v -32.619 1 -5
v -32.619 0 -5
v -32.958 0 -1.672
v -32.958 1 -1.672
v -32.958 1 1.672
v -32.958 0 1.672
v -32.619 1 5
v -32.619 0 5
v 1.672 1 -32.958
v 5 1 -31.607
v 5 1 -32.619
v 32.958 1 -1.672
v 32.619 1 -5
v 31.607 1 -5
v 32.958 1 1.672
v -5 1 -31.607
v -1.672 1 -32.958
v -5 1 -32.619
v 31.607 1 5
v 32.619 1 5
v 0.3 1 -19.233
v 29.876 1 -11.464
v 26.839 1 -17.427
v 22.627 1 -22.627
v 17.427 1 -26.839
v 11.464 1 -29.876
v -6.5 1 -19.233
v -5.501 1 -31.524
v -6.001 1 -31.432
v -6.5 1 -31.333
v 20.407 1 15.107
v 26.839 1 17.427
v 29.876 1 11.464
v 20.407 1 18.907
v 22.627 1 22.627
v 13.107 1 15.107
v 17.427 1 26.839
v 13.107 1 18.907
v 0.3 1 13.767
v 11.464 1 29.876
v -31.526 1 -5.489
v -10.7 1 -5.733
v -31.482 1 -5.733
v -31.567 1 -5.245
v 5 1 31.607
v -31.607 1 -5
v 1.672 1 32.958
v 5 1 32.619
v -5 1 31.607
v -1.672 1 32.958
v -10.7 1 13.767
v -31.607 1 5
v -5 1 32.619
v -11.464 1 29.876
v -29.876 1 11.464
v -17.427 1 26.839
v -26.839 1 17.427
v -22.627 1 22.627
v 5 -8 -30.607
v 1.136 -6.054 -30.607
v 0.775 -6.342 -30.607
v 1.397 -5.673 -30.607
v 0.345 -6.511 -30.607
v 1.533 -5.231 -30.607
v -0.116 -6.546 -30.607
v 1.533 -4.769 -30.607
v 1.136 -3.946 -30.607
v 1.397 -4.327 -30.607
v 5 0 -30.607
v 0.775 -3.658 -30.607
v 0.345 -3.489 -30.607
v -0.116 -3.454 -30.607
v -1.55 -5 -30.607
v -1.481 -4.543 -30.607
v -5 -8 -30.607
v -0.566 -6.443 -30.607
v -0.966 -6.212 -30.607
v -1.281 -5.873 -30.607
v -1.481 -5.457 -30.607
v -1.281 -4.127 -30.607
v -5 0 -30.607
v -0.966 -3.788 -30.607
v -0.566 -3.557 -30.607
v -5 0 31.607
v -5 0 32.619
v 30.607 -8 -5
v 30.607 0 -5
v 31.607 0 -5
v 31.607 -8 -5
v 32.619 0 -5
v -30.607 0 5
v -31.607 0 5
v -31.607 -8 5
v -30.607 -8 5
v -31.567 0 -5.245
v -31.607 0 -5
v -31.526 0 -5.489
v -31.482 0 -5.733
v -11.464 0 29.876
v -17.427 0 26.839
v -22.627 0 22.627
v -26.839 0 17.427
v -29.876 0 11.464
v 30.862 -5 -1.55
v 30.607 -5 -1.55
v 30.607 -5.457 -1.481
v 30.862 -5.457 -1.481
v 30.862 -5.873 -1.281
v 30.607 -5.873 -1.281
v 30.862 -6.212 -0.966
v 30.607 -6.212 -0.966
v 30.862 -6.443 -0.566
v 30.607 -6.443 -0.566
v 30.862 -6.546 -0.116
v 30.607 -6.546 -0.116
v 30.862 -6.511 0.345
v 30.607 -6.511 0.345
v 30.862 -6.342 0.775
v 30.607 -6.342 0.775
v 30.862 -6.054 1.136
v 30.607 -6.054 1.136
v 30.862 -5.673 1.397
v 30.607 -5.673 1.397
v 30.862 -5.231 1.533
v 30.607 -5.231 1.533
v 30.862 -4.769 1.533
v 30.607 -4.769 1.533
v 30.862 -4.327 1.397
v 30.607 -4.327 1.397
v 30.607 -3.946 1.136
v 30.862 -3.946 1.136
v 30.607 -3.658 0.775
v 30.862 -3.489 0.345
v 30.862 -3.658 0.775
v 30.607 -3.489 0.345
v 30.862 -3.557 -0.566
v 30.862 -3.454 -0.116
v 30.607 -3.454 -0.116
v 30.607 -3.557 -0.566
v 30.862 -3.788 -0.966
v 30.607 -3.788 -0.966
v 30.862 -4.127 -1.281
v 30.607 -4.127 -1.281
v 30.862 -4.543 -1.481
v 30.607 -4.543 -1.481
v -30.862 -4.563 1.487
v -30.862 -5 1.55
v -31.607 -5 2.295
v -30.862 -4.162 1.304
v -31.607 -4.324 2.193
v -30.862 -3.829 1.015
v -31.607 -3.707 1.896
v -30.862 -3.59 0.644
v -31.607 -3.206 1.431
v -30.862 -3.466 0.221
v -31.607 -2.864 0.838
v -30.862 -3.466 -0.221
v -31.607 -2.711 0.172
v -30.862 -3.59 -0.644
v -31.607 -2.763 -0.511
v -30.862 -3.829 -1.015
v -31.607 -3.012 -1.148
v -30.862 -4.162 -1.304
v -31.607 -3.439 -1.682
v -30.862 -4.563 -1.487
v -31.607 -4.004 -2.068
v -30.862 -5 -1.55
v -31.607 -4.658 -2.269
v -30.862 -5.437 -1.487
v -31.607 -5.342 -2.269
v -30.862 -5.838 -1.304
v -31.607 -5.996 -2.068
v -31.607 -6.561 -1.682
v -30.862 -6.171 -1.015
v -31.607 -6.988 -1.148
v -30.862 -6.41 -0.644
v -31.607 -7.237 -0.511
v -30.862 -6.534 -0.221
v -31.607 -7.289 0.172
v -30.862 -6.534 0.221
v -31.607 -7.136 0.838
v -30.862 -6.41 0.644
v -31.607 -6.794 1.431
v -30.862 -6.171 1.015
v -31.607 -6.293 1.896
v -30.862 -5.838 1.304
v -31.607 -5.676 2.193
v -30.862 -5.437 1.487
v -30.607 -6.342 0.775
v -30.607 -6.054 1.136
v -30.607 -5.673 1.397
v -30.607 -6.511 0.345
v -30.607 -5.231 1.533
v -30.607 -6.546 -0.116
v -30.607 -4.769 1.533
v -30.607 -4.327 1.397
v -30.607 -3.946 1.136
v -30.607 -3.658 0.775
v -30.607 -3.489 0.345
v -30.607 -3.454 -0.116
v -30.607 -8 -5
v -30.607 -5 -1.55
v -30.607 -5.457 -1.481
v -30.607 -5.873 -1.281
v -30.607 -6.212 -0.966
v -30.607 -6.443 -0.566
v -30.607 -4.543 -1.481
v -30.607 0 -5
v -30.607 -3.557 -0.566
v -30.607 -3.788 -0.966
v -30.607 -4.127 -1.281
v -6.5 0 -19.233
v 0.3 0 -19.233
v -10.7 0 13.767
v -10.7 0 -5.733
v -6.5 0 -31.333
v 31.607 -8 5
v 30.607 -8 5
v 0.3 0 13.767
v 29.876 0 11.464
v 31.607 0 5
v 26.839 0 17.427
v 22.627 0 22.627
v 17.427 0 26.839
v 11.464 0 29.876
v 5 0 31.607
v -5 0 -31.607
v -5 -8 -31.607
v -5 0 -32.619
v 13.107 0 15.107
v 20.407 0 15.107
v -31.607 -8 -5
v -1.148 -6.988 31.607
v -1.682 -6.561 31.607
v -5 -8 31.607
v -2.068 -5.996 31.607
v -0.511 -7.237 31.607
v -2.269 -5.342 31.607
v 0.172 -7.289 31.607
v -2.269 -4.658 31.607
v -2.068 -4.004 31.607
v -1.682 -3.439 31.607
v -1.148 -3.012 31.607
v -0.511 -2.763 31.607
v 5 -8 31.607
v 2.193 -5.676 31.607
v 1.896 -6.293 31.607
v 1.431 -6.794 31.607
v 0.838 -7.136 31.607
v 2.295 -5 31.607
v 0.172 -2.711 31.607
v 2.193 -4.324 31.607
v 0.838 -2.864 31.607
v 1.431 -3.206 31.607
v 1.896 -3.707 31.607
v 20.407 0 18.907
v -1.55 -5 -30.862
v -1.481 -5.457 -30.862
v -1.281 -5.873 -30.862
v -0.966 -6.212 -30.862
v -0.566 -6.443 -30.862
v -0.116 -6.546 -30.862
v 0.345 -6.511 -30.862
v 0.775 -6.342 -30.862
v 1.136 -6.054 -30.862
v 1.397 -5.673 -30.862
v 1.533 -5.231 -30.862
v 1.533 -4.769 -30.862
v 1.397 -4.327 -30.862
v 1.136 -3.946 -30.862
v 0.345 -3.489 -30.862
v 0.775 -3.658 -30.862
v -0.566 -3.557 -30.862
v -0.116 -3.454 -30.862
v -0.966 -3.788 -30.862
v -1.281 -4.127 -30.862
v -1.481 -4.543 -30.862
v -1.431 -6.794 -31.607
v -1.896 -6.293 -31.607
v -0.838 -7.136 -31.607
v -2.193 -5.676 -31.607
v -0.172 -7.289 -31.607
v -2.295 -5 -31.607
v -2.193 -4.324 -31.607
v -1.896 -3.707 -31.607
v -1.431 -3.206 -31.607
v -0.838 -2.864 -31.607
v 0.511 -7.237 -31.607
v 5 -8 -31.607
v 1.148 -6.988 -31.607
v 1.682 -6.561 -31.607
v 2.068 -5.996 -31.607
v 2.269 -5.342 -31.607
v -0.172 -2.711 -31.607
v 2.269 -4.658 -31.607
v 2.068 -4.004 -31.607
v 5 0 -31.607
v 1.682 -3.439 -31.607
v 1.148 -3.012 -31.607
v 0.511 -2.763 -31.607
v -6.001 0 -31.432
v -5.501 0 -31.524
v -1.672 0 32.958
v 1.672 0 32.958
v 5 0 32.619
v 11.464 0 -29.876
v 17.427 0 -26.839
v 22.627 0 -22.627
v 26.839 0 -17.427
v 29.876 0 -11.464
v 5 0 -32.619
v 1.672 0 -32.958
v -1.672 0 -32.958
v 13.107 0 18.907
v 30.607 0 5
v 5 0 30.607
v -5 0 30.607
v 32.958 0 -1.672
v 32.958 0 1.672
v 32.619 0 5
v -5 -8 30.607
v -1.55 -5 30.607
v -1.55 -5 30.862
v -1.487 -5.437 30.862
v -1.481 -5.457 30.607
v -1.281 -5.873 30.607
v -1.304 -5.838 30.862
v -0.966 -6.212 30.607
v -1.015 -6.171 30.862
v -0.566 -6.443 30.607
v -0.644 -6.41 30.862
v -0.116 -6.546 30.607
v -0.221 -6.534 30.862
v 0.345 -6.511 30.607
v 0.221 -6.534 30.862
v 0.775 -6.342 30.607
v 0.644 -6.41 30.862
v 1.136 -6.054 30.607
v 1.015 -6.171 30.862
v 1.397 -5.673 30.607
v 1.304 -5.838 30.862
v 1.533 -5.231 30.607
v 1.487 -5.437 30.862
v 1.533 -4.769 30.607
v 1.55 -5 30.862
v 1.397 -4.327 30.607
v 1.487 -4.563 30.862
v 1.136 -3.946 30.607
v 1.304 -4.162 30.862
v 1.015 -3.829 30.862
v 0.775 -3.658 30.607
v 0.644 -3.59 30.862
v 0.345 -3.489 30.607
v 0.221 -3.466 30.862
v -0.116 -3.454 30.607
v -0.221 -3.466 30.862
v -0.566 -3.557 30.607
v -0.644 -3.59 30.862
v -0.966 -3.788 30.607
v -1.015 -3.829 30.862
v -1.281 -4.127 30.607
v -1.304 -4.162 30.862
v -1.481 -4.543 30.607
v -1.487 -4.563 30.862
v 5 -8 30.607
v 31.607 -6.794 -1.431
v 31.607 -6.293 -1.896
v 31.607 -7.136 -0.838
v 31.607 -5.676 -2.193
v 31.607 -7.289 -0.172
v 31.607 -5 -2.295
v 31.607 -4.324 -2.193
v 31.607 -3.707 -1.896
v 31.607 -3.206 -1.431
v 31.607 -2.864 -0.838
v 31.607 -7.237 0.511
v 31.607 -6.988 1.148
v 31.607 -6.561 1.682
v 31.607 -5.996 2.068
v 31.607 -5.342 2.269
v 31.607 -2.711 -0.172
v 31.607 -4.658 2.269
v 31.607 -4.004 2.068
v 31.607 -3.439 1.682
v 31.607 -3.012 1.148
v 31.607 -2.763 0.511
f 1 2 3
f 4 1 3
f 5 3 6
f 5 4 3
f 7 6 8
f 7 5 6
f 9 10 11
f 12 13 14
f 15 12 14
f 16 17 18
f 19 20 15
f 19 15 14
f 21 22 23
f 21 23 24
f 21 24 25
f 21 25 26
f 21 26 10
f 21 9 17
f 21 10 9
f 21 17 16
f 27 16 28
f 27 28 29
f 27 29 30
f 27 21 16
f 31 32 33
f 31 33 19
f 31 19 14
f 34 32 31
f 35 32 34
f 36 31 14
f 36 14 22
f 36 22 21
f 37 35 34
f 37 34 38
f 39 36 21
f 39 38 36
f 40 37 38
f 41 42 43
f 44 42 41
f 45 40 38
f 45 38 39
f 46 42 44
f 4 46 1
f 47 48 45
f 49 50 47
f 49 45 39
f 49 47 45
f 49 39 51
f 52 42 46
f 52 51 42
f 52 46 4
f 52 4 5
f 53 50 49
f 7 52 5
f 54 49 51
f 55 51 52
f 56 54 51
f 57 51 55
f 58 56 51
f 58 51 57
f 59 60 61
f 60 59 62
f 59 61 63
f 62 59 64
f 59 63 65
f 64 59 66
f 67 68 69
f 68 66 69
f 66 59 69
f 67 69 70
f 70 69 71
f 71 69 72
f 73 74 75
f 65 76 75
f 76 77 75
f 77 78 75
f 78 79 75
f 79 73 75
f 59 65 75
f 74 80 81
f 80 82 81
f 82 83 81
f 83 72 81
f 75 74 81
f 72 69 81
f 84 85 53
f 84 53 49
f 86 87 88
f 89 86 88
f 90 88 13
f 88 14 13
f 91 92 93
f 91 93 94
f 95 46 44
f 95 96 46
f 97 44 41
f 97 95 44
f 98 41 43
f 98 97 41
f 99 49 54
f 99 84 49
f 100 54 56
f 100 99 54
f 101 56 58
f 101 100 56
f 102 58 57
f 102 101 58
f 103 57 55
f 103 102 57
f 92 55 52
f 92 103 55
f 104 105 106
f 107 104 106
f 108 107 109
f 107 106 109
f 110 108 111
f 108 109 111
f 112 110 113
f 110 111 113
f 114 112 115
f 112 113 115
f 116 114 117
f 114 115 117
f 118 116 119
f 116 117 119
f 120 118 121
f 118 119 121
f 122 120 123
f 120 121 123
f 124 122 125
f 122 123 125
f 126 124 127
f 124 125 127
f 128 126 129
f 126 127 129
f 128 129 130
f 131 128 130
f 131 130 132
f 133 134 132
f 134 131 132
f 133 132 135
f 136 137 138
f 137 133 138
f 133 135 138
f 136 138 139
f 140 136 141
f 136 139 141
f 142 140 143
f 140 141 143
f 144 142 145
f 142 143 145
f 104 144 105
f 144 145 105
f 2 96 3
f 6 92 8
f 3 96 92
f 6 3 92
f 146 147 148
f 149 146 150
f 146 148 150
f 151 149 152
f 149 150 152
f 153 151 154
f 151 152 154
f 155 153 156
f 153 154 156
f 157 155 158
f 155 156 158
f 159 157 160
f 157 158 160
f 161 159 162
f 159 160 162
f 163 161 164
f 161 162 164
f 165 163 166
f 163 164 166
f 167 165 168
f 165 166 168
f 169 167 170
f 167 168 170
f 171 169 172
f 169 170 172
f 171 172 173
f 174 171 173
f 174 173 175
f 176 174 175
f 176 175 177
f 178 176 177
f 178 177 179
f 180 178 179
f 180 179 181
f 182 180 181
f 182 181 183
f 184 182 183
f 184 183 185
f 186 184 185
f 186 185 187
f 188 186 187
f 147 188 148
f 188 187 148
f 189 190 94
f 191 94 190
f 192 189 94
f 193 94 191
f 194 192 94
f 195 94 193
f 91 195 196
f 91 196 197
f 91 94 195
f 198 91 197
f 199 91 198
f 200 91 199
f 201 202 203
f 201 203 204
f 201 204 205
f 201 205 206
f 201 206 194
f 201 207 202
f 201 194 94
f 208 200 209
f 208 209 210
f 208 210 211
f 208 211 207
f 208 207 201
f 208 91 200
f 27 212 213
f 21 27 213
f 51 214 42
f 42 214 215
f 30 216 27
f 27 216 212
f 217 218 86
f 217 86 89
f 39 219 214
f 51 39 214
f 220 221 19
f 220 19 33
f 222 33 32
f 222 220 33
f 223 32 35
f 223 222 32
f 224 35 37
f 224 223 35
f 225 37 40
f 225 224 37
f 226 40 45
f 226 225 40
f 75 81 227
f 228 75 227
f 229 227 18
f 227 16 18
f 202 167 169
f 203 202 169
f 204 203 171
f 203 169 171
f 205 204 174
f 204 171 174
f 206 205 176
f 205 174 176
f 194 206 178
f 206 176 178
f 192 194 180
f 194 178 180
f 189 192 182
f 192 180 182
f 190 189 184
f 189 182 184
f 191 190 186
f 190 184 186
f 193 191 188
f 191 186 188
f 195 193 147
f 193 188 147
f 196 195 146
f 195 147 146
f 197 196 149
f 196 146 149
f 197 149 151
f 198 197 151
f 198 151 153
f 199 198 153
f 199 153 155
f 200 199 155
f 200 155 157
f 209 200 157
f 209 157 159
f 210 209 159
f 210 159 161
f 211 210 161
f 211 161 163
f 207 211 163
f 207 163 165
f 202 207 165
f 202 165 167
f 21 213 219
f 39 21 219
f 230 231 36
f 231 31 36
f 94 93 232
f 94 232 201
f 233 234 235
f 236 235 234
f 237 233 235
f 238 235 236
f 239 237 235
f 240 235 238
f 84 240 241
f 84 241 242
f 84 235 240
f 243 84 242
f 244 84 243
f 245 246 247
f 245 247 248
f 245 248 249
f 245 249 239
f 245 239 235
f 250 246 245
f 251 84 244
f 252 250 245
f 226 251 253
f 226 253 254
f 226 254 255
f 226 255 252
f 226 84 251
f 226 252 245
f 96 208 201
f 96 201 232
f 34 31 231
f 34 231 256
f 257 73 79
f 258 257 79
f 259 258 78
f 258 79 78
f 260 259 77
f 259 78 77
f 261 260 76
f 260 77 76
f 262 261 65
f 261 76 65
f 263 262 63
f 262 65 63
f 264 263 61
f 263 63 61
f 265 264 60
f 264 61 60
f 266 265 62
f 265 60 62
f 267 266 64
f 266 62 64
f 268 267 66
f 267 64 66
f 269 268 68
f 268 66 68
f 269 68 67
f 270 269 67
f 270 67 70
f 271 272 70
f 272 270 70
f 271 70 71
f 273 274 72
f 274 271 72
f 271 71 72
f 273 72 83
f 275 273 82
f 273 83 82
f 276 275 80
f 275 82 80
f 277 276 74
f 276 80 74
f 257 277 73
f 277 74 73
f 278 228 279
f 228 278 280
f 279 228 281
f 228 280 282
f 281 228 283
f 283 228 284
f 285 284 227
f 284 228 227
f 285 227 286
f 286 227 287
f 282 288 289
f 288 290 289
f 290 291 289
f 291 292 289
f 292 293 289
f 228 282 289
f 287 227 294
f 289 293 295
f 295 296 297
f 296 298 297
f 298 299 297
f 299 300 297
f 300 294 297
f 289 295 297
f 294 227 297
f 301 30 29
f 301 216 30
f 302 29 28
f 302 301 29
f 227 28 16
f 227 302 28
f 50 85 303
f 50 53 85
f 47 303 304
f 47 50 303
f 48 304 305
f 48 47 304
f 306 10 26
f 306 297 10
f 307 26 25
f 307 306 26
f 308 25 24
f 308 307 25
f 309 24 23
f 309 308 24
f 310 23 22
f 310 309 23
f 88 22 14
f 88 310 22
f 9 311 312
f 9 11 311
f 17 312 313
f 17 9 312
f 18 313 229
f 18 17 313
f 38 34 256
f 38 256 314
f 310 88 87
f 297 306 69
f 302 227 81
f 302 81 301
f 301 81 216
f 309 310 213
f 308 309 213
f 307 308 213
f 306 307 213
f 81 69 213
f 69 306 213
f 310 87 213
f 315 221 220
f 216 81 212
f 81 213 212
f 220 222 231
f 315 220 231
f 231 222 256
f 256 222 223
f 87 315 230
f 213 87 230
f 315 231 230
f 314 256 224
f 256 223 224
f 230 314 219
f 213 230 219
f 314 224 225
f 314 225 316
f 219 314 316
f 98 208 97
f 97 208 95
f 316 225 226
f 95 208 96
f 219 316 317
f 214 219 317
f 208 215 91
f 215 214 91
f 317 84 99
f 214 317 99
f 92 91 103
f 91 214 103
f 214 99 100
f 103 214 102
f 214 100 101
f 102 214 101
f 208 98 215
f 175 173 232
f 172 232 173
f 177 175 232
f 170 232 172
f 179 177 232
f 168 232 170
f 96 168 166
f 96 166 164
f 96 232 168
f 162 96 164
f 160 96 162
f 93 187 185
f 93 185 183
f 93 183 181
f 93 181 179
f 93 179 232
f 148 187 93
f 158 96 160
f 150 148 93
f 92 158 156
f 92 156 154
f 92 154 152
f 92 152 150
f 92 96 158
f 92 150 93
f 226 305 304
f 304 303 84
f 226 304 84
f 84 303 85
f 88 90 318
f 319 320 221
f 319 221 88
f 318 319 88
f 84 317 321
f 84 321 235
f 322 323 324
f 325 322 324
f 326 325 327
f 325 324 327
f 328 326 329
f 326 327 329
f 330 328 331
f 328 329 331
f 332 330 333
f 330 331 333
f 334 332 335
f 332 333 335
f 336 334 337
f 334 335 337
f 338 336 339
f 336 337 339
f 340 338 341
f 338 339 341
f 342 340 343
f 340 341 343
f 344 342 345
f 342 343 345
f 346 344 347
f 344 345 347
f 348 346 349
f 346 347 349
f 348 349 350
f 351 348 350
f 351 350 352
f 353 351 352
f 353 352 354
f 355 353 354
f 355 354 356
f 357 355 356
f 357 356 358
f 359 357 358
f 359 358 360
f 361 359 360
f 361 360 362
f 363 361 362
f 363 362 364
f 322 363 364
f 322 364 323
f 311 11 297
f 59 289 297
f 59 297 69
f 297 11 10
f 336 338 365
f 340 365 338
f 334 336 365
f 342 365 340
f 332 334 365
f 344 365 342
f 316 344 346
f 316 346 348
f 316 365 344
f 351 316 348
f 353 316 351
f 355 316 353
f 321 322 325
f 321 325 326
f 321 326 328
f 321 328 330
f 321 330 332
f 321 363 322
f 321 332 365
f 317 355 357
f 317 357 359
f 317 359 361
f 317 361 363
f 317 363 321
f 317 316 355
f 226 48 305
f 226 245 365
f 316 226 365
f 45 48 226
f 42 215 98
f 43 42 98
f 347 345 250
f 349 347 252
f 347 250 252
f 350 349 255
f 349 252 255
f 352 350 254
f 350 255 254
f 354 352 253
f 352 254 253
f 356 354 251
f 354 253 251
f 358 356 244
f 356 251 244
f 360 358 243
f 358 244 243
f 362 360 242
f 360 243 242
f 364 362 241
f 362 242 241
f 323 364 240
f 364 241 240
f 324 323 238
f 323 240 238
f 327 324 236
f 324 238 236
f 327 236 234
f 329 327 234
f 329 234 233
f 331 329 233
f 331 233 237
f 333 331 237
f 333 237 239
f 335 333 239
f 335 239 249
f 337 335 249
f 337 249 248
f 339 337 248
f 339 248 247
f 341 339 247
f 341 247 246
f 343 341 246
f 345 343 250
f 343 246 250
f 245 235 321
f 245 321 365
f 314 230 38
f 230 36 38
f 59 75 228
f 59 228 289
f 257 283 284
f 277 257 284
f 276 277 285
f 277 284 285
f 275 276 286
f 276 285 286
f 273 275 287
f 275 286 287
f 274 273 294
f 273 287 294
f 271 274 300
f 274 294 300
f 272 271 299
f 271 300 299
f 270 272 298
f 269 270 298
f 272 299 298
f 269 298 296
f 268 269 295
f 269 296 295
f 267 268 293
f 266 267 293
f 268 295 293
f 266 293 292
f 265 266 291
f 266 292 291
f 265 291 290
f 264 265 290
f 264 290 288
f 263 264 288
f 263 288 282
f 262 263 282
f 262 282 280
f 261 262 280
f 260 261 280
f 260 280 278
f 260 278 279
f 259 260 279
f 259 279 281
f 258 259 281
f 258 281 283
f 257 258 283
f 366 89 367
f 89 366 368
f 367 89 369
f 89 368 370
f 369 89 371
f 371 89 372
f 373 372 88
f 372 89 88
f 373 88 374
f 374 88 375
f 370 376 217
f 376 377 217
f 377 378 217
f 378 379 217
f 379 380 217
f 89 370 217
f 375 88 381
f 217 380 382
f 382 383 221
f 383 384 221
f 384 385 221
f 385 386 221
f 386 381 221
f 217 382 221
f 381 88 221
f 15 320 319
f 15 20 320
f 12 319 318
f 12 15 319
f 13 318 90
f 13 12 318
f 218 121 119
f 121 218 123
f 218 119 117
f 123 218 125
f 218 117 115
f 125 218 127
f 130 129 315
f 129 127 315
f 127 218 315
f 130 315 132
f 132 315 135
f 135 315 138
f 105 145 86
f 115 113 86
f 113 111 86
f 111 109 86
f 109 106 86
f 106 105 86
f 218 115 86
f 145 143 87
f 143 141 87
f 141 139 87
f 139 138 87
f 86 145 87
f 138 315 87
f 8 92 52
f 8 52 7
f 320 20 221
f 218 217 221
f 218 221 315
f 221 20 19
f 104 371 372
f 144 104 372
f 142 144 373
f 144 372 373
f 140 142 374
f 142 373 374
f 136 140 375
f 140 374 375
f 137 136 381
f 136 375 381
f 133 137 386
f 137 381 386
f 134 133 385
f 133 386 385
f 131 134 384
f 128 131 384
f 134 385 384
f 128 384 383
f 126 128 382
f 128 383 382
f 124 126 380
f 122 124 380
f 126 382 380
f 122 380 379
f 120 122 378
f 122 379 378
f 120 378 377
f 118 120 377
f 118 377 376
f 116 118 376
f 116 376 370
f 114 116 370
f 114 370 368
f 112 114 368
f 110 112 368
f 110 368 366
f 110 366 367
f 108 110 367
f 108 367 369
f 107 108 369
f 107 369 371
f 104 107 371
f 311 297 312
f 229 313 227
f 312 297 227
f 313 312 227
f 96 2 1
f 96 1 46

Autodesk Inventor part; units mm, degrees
ref_plane "YZ Plane" through (0, 0, 0) normal (1, 0, 0) x (0, 1, 0)
ref_plane "XZ Plane" through (0, 0, 0) normal (0, 1, 0) x (-1, 0, 0)
sketch "Sketch1" plane through (0, 0, 0) normal (0, 1, 0) x (-1, 0, 0)
  arc A0 (31.6389, 4.7938) -> (6.5, -31.3329) centre (0, 0) ccw
  line L0 (-5, 33) -> (5, 33)
  line L1 (5, 33) -> (5, 31.607)
  line L2 (5, -33) -> (-5, -33)
  line L3 (-5, -33) -> (-5, 5)
  line L4 (-5, 33) -> (5, -33) construction
  line L5 (5, 33) -> (-5, -33) construction
  line L6 (-33, 5) -> (-5, 5)
  line L7 (33, 5) -> (33, -5)
  line L8 (33, -5) -> (31.607, -5)
  line L9 (-33, -5) -> (-33, 5)
  line L10 (-33, 5) -> (33, -5) construction
  line L11 (33, 5) -> (-33, -5) construction
  arc A1 (4.7938, -31.6389) -> (6.5, -31.3329) centre (0, 0) ccw
  line L12 (6.5, -31.3329) -> (6.5, -19.2329)
  line L13 (6.5, -19.2329) -> (-0.3, -19.2329)
  line L14 (-0.3, -19.2329) -> (-0.3, -5.7329)
  line L15 (-0.3, 13.7671) -> (5, 13.7671)
  line L16 (10.7, 13.7671) -> (10.7, 5)
  line L17 (10.7, -5.7329) -> (31.4823, -5.7329)
  arc A2 (31.4823, -5.7329) -> (31.607, -5) centre (0, 0) ccw
  arc A3 (31.6389, -4.7938) -> (31.6389, 4.7938) centre (0, 0) ccw
  line L18 (5, -19.2329) -> (5, -33)
  line L19 (5, 13.7671) -> (5, 5)
  line L20 (10.7, 1.6212) -> (10.7, -5.7329)
  line L21 (-0.3, -5) -> (-0.3, 5)
  arc A4 (6.5, -31.3329) -> (10.7, -30.1581) centre (0, 0) ccw
  line L22 (5, -5) -> (0.7576, -5)
  line L23 (5, 5) -> (10.7, 5)
  line L24 (-5, 5) -> (-0.3, 5)
  line L25 (-5, -5) -> (-33, -5)
  line L26 (-5, 5) -> (-5, 33)
  line L27 (5, 5) -> (5, -5)
  line L28 (5, 31.607) -> (5, 13.7671)
  arc A5 (10.7, -30.1581) -> (31.4823, -5.7329) centre (0, 0) ccw
  arc A6 (6.5, -31.3329) -> (31.6389, -4.7938) centre (0, 0) ccw
  line L29 (-0.3, -5.7329) -> (-0.3, -5)
  line L30 (5, -5) -> (5, -5.7329)
  line L31 (10.7, 5) -> (31.607, 5)
  line L32 (10.7, -5) -> (5, -5)
  line L33 (0.7576, 5) -> (5, 5)
  line L34 (-0.3, 5) -> (0.7576, 5)
  line L35 (5, 13.7671) -> (10.7, 13.7671)
  line L36 (-0.3, 5) -> (-0.3, 13.7671)
  line L37 (31.607, 5) -> (33, 5)
  line L38 (10.7, 5) -> (10.7, 1.6212)
  line L39 (31.607, -5) -> (10.7, -5)
  line L40 (0.7576, -5) -> (-5, -5)
  line L41 (5, -5.7329) -> (5, -19.2329)
  dimension "d0" = 64
  dimension "d1" = 10
  dimension "d2" = 66
  dimension "d3" = 66
  dimension "d4" = 10
  dimension "d11" = 12.1
  dimension "d12" = 6.8
  dimension "d13" = 33
  dimension "d14" = 0.3
  dimension "d15" = 11
  dimension "d16" = 19.5
ref_plane "Work Plane1" through (0, 1, 0) normal (0, 1, 0) x (1, 0, 0)
sketch "Sketch2" plane through (0, 1, 0) normal (0, 1, 0) x (1, 0, 0)
  circle A0 centre (0, 0) radius 33
  dimension "d7" = 66
extrude "Extrusion2" [suppressed]
extrude "Extrusion3" add sketch "Sketch1" along normal blind 1 contours A3 A6 L39 L20 L38 L31 A0 | A0 L37 L7 L8 A6 A3 | L31 L16 L35 L28 A0 | L28 L15 L36 L24 L26 A0 | A0 L26 L0 L1 | A2 L17 L20 L39 | L26 L6 A0 | L6 L3 L25 A0 | A0 L25 L9 L6 | L24 L21 L40 L3 | L25 L3 A0 | L40 L29 L14 L13 L18 A0 L3 | A0 L18 L13 L12 | A0 L18 L2 L3
sketch "Sketch3" plane through (0, 0, 0) normal (0, -1, 0) x (1, 0, 0)
  line L0 (-5, -33) -> (-5, -31.607) projected
  line L1 (-5, -31.607) -> (5, -31.607)
  line L2 (5, -31.607) -> (5, -30.607)
  line L3 (5, -30.607) -> (-5, -30.607)
  line L4 (-5, -30.607) -> (-5, -31.607)
  line L5 (-33, 5) -> (-31.607, 5) projected
  line L6 (-31.607, 5) -> (-30.607, 5)
  line L7 (-30.607, 5) -> (-30.607, -5)
  line L8 (-30.607, -5) -> (-31.607, -5)
  line L9 (-31.607, -5) -> (-31.607, 5)
  line L10 (-5, 31.607) -> (-5, 33) projected
  line L11 (-5, 31.607) -> (5, 31.607)
  line L12 (5, 31.607) -> (5, 30.607)
  line L13 (5, 30.607) -> (-5, 30.607)
  line L14 (-5, 30.607) -> (-5, 31.607)
  line L15 (31.607, 5) -> (30.607, 5)
  line L16 (30.607, 5) -> (30.607, -5)
  line L17 (30.607, -5) -> (31.607, -5)
  line L18 (31.607, -5) -> (31.607, 5)
  line L19 (31.607, 5) -> (33, 5) projected
  dimension "d21" = 10
  dimension "d22" = 1
  dimension "d23" = 1
  dimension "d24" = 10
  dimension "d25" = 10
  dimension "d26" = 1
  dimension "d27" = 1
  dimension "d28" = 10
extrude "Extrusion4" add sketch "Sketch3" along normal blind 8
sketch "Sketch4" plane through (31.607, 0, 5) normal (1, 0, 0) x (0, 0, -1)
  circle A0 centre (5, -5) radius 2.295
  line L0 (0, 0) -> (10, 0) projected
  point P0 (5, 0)
  point P1 (5, 0)
  dimension "d31" = 4.59
  dimension "d32" = 5
hole "Hole1" at (31.607, -5, 0) direction (-1, 0, 0) diameter 3.1 end through all countersink diameter 4.59 countersink angle 90
pattern_circular "Circular Pattern1" count 4 over 360 about axis through (0, 0, 0) along (0, 1, 0) of "Hole1"
sketch "Sketch5" plane through (0, 1, 0) normal (0, 1, 0) x (1, 0, 0)
  circle A0 centre (0, 0) radius 33
  dimension "d43" = 66
extrude "Extrusion5" cut sketch "Sketch5" against normal blind 100 keep common part
sketch "Sketch6" plane through (0, 1, 0) normal (0, 1, 0) x (1, 0, 0)
  arc A0 (5, -31.607) -> (31.607, -5) centre (0, 0) ccw projected
  line L0 (5, -31.607) -> (5, -18.907)
  line L1 (31.607, -5) -> (20.407, -5)
  line L2 (20.407, -5) -> (20.407, -18.907)
  line L3 (20.407, -18.907) -> (5, -18.907)
  line L4 (13.107, -18.907) -> (20.407, -18.907)
  line L5 (20.407, -18.907) -> (20.407, -15.107)
  line L6 (20.407, -15.107) -> (13.107, -15.107)
  line L7 (13.107, -15.107) -> (13.107, -18.907)
  dimension "d46" = 12.7
  dimension "d47" = 11.2
  dimension "d48" = 7.3
  dimension "d49" = 3.8
extrude "Extrusion6" cut sketch "Sketch6" against normal blind 10 contours L7 L6 L2 L3
properties part number "Hull_top"
